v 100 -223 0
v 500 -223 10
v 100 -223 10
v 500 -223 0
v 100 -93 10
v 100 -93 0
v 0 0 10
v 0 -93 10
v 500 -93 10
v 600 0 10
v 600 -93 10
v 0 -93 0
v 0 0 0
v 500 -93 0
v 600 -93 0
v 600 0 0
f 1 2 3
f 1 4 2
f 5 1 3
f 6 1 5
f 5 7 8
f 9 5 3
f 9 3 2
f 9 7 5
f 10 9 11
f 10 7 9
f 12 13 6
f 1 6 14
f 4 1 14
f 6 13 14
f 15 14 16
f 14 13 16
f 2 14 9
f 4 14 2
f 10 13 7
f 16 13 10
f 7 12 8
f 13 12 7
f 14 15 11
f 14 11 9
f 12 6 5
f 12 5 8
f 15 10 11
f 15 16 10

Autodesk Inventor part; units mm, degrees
ref_plane "YZ Plane" through (0, 0, 0) normal (1, 0, 0) x (0, 1, 0)
ref_plane "XZ Plane" through (0, 0, 0) normal (0, 1, 0) x (-1, 0, 0)
ref_plane "XY Plane" through (0, 0, 0) normal (0, 0, 1) x (1, 0, 0)
sketch "Sketch1" plane through (0, 0, 0) normal (0, 0, 1) x (1, 0, 0)
  line L0 (0, 0) -> (600, 0)
  line L1 (600, 0) -> (600, -93)
  line L2 (600, -93) -> (0, -93)
  line L3 (0, -93) -> (0, 0)
  line L4 (100, -93) -> (500, -93)
  line L5 (500, -93) -> (500, -223)
  line L6 (500, -223) -> (100, -223)
  line L7 (100, -223) -> (100, -93)
  point P0 (300, -93)
  point P1 (300, -223)
  dimension "d0" = 600
  dimension "d1" = 93
  dimension "d2" = 400
  dimension "d6" = 223
extrude "Extrusion1" add sketch "Sketch1" along normal blind 10
properties part number "Front Cover" material "ABS Plastic"
